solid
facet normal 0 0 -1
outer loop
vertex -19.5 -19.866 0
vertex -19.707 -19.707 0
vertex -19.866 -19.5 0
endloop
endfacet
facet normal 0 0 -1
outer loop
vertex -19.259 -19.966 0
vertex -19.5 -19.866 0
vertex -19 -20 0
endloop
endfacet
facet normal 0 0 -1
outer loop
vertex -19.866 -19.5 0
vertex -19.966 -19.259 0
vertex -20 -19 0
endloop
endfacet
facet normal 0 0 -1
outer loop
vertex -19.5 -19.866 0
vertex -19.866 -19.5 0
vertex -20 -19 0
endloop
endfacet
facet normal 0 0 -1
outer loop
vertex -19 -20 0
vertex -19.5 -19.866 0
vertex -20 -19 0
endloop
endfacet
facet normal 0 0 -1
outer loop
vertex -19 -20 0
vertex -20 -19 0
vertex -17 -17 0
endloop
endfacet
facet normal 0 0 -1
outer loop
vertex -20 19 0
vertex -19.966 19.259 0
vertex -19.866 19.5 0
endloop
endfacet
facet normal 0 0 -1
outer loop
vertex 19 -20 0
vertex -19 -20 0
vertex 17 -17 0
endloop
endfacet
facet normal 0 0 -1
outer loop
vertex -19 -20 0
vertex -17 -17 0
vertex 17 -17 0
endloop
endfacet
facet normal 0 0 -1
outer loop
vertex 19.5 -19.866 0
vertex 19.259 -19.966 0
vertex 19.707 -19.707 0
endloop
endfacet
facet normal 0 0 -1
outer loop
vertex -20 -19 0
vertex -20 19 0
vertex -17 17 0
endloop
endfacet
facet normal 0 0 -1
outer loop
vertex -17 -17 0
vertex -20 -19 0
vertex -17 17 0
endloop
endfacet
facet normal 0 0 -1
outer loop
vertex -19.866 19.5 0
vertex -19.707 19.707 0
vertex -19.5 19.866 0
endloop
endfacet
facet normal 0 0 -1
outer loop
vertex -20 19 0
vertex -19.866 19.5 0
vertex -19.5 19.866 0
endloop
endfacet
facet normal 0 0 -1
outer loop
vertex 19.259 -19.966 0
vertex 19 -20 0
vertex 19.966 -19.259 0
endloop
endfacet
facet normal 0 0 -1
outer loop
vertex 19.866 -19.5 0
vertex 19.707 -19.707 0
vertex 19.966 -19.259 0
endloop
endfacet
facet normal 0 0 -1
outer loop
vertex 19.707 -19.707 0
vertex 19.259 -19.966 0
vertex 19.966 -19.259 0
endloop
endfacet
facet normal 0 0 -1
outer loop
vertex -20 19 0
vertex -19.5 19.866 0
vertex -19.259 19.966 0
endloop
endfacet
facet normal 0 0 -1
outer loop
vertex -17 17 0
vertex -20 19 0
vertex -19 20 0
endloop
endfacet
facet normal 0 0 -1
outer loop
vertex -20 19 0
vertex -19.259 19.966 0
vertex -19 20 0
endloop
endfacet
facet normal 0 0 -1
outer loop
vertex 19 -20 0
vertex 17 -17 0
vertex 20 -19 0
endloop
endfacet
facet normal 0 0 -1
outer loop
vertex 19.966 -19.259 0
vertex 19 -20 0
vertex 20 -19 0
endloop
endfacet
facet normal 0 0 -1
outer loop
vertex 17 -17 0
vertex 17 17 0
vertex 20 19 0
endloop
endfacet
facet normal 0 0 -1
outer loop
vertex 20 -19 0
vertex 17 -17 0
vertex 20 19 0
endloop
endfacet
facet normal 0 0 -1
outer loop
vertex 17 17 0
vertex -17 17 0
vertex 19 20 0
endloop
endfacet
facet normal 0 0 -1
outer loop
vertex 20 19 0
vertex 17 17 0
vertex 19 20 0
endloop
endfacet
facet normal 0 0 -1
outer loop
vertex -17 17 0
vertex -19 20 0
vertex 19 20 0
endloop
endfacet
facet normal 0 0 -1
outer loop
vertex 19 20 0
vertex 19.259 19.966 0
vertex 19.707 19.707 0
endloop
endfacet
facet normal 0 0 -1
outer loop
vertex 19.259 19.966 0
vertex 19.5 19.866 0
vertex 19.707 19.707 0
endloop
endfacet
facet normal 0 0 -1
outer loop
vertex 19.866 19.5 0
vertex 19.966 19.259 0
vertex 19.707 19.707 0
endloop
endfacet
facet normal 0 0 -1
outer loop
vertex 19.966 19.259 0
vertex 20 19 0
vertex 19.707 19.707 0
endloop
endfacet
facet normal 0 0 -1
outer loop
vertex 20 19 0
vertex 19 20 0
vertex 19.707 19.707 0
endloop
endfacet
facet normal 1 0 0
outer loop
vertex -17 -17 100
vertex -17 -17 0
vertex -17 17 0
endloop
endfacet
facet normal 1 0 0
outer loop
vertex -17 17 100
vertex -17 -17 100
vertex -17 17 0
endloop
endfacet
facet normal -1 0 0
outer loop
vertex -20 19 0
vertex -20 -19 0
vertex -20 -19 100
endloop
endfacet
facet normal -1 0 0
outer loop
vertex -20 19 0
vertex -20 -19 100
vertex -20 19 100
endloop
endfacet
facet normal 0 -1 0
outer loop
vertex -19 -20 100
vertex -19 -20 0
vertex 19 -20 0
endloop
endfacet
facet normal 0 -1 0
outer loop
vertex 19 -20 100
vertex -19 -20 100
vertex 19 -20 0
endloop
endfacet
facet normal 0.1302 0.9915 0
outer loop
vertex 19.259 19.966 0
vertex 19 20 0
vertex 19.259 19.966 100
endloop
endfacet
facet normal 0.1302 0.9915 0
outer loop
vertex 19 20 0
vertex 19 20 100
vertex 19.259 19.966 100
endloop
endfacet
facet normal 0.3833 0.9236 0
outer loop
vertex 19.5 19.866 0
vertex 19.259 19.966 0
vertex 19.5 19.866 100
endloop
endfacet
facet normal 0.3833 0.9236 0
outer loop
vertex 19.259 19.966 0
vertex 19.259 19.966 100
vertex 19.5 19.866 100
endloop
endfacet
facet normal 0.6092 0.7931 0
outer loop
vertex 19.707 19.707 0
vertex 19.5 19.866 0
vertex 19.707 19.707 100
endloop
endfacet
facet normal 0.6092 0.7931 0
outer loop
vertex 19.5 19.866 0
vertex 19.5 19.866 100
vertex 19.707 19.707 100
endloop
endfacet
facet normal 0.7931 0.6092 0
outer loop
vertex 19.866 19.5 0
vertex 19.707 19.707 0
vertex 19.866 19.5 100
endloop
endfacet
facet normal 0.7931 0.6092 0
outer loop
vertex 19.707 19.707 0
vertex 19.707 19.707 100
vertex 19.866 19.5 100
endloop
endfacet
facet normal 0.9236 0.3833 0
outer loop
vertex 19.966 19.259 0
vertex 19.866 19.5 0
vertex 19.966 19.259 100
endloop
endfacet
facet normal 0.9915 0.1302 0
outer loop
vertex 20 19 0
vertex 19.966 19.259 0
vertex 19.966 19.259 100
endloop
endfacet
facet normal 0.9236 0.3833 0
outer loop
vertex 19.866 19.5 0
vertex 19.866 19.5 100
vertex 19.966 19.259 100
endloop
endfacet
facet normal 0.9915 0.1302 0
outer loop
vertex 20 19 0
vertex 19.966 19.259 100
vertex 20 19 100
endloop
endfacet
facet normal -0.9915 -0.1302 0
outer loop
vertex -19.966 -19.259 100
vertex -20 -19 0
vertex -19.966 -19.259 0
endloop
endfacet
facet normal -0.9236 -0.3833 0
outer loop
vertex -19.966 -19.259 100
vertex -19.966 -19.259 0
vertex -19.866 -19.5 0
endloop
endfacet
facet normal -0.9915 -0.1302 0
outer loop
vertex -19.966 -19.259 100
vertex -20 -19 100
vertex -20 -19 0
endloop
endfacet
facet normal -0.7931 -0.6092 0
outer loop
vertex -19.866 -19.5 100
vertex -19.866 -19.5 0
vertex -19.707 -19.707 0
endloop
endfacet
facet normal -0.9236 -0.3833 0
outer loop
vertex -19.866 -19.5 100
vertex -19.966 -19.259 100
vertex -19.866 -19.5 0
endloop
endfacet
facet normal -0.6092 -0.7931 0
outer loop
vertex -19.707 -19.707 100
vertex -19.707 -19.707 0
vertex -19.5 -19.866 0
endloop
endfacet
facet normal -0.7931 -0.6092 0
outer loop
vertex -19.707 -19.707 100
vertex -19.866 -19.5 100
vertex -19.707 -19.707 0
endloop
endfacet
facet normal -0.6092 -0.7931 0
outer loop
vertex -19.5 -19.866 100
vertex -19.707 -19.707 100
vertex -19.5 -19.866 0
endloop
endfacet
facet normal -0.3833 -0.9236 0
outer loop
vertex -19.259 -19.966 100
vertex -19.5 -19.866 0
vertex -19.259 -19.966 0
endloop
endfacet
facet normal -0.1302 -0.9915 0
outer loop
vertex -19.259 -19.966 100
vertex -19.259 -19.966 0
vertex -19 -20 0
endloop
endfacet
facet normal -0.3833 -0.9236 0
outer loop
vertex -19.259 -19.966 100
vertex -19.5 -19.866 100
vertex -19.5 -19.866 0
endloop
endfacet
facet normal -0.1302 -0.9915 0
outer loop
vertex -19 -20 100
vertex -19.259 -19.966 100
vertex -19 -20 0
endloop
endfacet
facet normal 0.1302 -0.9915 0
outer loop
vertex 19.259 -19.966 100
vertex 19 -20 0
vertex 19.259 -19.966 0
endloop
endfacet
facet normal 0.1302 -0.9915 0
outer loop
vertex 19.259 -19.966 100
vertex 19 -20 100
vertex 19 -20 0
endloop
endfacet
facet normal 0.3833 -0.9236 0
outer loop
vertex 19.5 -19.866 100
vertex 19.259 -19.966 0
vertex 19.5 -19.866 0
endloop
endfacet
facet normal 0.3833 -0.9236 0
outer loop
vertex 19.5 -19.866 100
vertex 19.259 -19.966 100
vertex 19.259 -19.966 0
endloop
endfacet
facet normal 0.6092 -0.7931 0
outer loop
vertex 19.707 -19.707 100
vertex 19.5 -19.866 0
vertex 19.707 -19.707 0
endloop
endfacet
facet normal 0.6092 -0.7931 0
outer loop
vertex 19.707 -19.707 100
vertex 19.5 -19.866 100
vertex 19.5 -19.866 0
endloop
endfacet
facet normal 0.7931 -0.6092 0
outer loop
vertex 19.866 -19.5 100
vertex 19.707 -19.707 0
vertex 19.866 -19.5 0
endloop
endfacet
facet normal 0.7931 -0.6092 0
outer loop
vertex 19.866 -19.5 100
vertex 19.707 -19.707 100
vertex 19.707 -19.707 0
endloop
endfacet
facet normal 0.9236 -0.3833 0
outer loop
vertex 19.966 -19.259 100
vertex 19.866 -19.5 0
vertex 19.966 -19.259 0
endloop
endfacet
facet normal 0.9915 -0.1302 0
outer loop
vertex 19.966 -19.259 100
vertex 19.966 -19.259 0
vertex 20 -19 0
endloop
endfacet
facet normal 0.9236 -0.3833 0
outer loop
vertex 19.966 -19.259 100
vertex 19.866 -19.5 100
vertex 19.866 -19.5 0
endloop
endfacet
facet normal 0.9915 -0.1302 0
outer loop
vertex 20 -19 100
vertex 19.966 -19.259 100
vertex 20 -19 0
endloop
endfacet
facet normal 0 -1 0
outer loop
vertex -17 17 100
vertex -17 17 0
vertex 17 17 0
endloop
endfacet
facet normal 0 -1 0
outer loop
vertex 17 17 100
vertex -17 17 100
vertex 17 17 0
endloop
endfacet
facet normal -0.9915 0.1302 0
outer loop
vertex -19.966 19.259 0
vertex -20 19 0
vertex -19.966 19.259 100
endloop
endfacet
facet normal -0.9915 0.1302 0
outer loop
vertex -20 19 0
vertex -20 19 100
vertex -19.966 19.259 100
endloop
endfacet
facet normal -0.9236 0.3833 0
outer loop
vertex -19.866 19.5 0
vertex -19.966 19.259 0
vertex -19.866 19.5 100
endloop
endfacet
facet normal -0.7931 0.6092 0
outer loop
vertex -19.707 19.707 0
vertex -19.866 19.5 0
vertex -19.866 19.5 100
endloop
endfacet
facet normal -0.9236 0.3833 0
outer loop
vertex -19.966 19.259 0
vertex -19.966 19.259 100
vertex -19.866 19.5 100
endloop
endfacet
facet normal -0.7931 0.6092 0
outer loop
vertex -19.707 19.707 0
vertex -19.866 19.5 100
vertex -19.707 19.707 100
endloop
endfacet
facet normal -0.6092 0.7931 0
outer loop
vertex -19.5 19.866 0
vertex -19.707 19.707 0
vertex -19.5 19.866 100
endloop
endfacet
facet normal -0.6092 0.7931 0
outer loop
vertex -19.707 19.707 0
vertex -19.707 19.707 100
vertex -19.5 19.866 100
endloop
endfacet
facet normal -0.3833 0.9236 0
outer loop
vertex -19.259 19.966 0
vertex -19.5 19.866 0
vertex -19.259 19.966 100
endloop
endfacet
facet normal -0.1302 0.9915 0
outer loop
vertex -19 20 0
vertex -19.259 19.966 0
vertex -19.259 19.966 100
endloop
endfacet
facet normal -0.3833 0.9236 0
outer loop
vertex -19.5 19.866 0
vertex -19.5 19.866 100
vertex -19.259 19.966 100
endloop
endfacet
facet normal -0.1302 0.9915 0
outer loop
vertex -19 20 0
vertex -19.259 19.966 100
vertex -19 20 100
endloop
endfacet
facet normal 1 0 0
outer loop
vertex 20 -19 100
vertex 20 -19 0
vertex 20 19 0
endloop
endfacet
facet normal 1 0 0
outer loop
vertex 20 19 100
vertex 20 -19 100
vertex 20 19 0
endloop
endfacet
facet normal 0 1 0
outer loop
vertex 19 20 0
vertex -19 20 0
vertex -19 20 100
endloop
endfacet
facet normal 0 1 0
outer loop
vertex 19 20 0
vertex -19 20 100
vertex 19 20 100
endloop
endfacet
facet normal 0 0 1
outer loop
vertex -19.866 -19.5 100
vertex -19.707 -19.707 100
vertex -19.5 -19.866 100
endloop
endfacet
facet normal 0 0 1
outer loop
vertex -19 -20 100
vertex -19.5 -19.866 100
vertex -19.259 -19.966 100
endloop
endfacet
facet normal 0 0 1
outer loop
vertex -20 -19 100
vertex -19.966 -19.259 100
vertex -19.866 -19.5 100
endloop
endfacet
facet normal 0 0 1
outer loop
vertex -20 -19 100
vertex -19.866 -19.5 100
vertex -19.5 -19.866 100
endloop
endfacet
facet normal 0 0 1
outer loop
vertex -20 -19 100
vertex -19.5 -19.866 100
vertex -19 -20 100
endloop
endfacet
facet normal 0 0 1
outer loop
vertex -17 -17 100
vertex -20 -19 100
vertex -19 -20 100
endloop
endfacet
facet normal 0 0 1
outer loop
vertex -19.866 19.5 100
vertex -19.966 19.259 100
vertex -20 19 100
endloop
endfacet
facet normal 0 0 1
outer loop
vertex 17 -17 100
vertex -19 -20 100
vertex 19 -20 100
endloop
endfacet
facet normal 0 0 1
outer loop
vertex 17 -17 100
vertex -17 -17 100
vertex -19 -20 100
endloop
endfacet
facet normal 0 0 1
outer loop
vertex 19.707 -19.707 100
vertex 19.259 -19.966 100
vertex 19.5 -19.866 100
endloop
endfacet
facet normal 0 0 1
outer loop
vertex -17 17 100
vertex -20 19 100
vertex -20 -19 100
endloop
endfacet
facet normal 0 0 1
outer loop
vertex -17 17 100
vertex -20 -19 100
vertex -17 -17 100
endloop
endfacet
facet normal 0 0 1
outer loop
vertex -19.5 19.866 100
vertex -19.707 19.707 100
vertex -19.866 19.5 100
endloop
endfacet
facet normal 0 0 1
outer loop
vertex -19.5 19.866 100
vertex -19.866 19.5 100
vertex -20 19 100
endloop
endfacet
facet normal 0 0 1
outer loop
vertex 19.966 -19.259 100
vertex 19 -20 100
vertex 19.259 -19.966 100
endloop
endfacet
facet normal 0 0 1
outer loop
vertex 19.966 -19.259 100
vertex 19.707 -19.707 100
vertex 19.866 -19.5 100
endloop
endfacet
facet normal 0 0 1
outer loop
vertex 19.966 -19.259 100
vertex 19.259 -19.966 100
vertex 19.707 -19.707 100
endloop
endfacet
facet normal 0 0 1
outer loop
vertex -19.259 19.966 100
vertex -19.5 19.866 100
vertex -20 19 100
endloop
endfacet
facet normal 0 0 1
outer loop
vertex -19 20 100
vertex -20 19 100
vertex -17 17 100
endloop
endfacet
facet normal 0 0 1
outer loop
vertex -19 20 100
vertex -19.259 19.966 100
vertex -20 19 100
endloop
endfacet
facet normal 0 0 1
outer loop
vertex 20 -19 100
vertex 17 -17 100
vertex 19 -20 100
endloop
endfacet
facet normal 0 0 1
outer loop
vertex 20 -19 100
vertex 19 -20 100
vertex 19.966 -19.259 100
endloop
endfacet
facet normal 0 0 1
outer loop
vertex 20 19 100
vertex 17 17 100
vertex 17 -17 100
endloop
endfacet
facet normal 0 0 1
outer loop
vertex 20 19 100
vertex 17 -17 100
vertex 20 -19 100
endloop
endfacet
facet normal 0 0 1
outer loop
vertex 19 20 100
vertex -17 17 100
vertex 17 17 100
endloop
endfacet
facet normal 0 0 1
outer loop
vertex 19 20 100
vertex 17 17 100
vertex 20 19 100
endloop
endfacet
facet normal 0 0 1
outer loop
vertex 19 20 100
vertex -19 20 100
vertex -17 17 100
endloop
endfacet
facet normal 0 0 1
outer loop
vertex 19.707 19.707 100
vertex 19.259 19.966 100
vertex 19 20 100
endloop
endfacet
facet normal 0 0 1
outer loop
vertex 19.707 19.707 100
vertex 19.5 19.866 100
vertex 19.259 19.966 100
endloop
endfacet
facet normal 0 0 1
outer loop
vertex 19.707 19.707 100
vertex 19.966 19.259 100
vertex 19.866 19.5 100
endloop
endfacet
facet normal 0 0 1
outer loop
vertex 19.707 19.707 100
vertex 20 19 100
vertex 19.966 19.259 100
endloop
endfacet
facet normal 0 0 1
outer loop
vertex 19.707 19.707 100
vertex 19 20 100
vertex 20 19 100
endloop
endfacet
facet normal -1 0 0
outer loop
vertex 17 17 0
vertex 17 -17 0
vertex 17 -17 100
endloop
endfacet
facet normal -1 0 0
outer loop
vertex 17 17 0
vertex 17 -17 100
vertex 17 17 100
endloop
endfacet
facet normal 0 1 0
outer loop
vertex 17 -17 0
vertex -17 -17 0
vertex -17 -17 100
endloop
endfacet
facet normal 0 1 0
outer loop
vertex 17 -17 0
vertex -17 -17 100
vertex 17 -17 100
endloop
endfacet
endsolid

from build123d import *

# Parameters (mm, degrees)
SKETCH_W   = 40
SKETCH_H   = 40
SKETCH_W_2 = 34
SKETCH_H_2 = 34
PAD_DEPTH  = 100
FILLET_R   = 1


with BuildPart() as part:
    # Sketch → Pad (new body)
    with BuildSketch(Plane.XY):
        Rectangle(SKETCH_W, SKETCH_H)
        Rectangle(SKETCH_W_2, SKETCH_H_2, mode=Mode.SUBTRACT)
    extrude(amount=PAD_DEPTH)

    # Fillet
    fillet_edges = [part.edges().sort_by_distance(p)[0] for p in [
        (20, -20, 50),
        (20, 20, 50),
        (-20, -20, 50),
        (-20, 20, 50),
    ]]
    fillet(fillet_edges, radius=FILLET_R)


solid = part.part
